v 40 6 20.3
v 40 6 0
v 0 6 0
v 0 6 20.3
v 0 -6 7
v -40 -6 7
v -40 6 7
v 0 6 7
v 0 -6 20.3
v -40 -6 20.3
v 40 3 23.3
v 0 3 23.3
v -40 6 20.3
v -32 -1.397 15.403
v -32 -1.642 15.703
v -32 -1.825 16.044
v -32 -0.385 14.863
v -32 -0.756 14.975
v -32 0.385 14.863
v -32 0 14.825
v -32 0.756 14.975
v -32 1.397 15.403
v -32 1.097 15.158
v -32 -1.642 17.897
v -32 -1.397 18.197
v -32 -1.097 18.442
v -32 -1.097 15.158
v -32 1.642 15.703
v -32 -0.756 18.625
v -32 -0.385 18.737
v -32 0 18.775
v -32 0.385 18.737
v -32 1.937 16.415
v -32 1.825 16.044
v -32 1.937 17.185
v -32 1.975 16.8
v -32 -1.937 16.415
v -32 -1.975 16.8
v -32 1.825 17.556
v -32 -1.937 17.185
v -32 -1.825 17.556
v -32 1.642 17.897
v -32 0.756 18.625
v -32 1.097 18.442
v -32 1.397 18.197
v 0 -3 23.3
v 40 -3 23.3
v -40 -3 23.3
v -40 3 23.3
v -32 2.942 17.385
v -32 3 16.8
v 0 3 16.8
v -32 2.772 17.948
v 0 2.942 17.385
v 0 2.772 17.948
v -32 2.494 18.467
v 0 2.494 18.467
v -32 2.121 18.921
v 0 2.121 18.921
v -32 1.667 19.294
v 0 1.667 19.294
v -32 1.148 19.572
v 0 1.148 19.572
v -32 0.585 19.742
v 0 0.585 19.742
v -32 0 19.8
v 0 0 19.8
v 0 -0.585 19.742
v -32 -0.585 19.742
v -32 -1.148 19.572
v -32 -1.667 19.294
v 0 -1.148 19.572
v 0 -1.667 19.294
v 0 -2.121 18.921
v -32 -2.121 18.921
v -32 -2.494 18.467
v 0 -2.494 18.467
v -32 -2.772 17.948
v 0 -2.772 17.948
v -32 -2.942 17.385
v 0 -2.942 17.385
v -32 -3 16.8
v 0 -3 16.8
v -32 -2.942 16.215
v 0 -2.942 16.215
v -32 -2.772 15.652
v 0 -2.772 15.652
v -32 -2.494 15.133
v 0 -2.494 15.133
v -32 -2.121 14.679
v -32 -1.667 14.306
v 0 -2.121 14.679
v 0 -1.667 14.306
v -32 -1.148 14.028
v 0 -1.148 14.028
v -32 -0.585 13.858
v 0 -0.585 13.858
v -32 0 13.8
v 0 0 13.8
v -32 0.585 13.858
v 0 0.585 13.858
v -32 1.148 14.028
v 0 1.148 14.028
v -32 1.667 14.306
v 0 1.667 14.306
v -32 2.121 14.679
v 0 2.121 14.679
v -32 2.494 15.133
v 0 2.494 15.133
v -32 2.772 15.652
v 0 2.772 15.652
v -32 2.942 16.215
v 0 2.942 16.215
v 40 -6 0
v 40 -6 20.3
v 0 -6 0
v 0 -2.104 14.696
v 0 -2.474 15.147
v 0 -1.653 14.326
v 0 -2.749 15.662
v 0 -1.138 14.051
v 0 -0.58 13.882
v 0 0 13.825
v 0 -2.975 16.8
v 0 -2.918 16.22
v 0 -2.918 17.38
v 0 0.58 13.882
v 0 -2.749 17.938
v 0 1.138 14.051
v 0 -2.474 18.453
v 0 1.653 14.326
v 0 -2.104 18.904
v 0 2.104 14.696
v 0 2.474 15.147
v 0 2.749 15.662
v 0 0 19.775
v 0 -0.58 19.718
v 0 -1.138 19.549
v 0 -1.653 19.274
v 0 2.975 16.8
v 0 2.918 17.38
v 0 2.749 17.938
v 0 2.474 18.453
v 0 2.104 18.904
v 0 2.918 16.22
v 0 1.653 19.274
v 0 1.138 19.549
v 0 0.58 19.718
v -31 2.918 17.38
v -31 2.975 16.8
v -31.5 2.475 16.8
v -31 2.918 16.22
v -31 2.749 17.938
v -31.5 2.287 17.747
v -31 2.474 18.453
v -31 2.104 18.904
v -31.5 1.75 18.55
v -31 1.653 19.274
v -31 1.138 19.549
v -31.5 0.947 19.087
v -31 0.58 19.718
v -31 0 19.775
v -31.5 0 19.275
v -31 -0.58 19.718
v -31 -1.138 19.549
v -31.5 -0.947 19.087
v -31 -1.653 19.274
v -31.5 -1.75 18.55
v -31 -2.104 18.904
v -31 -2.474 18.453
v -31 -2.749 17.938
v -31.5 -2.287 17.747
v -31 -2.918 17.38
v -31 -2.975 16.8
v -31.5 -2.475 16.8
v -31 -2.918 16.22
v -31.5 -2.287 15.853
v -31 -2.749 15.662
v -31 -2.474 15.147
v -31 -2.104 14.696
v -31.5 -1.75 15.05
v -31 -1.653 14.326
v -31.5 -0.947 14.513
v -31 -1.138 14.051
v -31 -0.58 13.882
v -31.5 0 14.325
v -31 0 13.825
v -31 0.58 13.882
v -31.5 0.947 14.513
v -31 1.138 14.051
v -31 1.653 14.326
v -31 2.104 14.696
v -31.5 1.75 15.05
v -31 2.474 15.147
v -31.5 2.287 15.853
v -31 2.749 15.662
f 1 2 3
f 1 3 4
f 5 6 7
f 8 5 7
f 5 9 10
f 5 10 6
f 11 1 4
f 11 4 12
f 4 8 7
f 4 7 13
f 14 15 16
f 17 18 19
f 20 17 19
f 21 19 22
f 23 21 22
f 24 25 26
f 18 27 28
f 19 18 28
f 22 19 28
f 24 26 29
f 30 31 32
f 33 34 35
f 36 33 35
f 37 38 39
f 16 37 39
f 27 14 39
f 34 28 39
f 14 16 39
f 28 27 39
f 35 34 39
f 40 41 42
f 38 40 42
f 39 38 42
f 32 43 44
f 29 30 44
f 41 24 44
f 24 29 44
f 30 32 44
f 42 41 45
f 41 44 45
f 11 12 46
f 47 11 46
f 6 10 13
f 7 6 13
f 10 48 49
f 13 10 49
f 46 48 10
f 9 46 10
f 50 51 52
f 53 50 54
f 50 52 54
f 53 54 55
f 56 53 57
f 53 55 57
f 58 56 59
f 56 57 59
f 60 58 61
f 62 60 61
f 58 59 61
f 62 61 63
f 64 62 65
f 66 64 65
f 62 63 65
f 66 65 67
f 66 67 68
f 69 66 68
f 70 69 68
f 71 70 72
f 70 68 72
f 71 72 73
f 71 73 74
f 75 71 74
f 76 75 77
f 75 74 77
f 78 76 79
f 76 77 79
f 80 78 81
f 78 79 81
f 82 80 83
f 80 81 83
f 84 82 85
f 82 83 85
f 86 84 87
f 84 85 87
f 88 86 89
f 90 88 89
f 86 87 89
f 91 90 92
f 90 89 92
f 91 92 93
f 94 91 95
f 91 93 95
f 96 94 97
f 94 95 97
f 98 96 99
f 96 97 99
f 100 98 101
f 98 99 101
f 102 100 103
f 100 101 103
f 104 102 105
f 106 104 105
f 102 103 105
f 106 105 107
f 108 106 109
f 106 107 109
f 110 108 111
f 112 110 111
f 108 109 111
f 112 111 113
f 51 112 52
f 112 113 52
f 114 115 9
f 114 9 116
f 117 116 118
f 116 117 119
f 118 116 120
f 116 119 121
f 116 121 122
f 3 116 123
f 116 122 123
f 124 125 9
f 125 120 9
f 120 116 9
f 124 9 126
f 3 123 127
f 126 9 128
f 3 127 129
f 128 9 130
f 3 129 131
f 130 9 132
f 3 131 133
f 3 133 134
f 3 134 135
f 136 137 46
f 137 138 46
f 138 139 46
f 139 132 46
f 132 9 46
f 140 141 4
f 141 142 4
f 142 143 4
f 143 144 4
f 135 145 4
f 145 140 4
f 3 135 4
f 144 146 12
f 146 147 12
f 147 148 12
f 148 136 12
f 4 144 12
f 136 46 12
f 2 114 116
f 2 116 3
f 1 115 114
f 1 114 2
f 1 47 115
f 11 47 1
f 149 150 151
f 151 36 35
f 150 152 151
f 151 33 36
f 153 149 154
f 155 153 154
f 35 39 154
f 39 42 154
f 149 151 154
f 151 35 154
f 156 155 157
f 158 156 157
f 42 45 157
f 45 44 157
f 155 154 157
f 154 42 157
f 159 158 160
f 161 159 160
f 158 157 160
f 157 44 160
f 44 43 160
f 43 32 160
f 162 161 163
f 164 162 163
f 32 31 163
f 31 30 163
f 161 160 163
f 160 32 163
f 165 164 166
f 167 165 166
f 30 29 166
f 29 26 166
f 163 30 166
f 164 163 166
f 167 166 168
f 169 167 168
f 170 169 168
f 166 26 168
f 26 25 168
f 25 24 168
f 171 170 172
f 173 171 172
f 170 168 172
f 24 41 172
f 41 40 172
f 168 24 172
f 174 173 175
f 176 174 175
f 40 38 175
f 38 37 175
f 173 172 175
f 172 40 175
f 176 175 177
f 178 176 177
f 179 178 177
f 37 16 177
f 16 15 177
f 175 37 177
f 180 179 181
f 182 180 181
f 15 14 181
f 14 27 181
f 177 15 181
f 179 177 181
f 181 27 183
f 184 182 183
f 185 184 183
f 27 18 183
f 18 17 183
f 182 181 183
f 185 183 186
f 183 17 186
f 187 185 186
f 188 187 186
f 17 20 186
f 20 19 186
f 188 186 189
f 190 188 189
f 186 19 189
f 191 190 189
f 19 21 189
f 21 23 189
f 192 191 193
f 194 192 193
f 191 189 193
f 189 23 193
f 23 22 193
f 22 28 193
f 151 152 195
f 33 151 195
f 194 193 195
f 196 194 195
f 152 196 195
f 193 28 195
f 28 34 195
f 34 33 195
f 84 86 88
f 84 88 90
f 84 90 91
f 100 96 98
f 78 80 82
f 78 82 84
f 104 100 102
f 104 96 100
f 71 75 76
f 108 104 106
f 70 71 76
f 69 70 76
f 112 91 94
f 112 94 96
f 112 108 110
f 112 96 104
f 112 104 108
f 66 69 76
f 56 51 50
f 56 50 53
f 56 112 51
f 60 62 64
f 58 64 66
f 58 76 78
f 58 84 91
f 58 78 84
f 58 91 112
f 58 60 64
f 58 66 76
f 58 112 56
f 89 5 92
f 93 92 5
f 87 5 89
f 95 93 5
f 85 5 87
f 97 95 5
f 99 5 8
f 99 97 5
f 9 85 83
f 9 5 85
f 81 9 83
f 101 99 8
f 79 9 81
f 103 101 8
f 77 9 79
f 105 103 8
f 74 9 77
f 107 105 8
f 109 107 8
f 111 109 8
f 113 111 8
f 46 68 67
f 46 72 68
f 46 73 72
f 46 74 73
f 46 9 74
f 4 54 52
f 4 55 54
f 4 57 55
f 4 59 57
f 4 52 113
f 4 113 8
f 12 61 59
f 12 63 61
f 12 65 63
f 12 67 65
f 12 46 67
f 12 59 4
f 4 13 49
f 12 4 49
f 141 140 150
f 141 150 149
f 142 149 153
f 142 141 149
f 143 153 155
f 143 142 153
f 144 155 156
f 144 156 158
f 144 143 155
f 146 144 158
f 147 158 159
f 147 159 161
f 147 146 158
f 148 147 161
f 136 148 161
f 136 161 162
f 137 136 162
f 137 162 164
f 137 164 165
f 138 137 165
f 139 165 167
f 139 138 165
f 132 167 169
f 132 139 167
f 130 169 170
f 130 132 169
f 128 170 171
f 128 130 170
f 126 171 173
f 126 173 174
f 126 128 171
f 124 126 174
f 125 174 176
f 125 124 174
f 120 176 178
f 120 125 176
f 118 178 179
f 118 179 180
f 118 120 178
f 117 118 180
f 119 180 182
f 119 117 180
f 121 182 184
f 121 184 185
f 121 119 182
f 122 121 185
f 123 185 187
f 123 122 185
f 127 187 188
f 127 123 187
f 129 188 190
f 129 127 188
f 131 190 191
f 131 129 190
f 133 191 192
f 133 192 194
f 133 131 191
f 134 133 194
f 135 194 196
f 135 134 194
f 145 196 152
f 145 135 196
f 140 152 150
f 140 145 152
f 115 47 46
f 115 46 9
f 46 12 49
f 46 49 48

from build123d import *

# Parameters (mm, degrees)
F1_DEPTH = 40
F2_R     = 2.975
F3_DEPTH = 32
F4_SIZE  = 1
F6_DEPTH = 40
F7_R     = 3
F8_DEPTH = 32


with BuildPart() as f1:
    # F0 (on Right) → F1 (new body)
    with BuildSketch(Plane.YZ):
        Polygon((-6, 20.3), (-6, 0), (6, 0), (6, 20.3), (3, 23.3), (-3, 23.3), align=None)
    extrude(amount=F1_DEPTH)

    # F2 (on face) → F3 (join)
    with BuildSketch(Plane.YZ):
        with Locations((0, 16.8)):
            Circle(F2_R)
    extrude(amount=-F3_DEPTH)

    # F4
    f4_edges = [f1.edges().sort_by_distance(p)[0] for p in [
        (-32, -2.975, 16.8),
    ]]
    chamfer(f4_edges, length=F4_SIZE)


with BuildPart() as f6:
    # F5 (on face) → F6 (new body)
    with BuildSketch(Plane.YZ):
        Polygon((-6, 20.3), (-6, 7), (6, 7), (6, 20.3), (3, 23.3), (-3, 23.3), align=None)
    extrude(amount=-F6_DEPTH)

    # F7 (on face) → F8 (cut)
    with BuildSketch(Plane.YZ):
        with Locations((0, 16.8)):
            Circle(F7_R)
    extrude(amount=-F8_DEPTH, mode=Mode.SUBTRACT)


solid = Compound([f1.part, f6.part])
